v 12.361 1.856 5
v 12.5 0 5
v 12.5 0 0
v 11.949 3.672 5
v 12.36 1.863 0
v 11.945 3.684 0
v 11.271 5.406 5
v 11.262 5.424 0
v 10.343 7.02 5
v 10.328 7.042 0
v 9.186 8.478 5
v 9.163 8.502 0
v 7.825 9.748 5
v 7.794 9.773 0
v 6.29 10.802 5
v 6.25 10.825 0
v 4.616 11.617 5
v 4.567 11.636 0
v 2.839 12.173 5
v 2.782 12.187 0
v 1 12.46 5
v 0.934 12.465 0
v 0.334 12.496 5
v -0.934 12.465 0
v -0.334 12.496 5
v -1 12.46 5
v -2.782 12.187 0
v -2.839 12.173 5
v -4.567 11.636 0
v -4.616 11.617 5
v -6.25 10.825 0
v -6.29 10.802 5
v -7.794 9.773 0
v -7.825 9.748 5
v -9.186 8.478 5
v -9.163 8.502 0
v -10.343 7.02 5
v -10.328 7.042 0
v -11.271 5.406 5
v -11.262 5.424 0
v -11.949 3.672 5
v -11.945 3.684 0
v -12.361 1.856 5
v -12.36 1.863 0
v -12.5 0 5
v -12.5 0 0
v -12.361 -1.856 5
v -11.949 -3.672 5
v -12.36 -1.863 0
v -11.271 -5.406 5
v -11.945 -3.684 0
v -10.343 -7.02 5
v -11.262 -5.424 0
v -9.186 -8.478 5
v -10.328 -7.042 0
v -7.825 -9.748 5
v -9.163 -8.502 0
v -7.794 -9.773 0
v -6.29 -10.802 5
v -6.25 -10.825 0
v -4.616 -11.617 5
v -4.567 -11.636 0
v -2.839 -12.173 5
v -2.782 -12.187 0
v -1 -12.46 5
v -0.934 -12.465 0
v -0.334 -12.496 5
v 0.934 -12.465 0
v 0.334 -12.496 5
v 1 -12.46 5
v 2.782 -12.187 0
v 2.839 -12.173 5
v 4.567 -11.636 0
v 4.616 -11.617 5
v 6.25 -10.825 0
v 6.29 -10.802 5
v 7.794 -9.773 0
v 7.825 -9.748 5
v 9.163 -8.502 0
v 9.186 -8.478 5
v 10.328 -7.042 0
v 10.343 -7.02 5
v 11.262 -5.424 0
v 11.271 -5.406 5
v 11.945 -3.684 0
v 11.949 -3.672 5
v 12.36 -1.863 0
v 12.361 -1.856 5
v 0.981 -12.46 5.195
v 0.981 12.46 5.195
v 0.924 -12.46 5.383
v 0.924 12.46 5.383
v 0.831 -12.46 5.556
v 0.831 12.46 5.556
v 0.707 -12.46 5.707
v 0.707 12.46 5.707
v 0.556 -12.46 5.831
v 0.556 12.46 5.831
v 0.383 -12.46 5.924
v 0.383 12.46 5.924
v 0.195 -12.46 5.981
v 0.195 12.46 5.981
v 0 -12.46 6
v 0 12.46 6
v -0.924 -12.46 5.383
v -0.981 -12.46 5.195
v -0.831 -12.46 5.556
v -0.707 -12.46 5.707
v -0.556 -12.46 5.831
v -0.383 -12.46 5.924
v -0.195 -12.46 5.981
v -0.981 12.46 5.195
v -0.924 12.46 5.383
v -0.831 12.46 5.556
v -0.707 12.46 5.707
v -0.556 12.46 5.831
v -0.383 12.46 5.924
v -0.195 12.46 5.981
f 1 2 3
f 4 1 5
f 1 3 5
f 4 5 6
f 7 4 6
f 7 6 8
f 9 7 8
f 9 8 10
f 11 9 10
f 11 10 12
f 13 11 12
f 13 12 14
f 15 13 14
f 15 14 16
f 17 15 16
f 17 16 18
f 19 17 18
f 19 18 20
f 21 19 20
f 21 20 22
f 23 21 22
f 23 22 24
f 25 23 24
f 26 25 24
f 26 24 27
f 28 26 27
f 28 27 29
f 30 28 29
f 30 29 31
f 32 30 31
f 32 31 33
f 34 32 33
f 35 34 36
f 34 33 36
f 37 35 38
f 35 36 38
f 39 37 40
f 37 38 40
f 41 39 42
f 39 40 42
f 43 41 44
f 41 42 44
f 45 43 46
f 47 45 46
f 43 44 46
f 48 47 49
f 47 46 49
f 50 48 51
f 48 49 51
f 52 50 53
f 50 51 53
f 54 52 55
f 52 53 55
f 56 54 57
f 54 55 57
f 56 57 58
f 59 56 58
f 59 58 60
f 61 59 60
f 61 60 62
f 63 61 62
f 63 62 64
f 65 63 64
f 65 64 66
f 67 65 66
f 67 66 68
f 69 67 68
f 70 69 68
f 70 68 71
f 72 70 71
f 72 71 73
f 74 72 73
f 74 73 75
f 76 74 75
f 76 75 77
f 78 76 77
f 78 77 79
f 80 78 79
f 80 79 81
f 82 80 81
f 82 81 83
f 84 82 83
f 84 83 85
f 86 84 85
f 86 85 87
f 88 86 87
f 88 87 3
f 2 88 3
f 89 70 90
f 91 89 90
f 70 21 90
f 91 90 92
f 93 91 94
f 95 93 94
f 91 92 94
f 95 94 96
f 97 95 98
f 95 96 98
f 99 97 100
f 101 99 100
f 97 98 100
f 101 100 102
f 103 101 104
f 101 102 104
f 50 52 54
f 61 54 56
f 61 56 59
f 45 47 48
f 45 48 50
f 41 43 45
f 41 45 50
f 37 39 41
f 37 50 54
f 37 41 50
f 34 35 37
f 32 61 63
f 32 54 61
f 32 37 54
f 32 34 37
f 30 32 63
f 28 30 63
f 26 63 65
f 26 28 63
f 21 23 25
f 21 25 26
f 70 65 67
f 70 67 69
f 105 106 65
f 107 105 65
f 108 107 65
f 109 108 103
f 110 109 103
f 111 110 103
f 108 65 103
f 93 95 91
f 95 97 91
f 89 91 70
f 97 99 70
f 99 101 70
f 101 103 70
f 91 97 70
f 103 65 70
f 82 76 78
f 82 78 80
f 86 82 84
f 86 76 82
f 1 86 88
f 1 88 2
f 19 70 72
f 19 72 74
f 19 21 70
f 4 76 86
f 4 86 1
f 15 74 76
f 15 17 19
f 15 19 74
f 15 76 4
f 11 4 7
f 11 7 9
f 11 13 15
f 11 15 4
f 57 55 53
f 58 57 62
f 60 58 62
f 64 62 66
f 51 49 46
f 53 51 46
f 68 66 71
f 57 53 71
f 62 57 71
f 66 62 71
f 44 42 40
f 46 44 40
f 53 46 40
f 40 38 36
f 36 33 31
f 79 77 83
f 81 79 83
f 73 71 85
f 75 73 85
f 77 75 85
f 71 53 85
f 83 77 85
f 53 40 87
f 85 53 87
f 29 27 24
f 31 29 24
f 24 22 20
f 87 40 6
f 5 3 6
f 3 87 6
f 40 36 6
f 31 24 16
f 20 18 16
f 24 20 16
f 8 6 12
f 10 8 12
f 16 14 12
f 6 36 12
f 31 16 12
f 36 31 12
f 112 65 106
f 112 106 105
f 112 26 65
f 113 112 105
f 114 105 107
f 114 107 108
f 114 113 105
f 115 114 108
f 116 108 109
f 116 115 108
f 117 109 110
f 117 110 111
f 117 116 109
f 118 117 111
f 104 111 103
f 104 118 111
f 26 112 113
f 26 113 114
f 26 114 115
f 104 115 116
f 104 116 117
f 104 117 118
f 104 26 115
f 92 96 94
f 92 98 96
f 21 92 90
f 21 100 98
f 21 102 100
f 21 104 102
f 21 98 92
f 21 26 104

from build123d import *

# Parameters (mm, degrees)
F0_R     = 12.5
F1_DEPTH = 5
F2_W     = 2
F2_H     = 24.9198715888
F3_DEPTH = 1
F4_R     = 0.99999


# Not quite as in the source:
# - a fillet or chamfer is up to 0.001 mm smaller than in the source, because OpenCascade refuses the exact size


with BuildPart() as f1:
    # F0 (on Top) → F1 (new body)
    with BuildSketch(Plane.XY):
        Circle(F0_R)
    extrude(amount=F1_DEPTH)

    # F2 (on face) → F3 (join)
    with BuildSketch(Plane.XY.offset(5)):
        Rectangle(F2_W, F2_H)
    extrude(amount=F3_DEPTH)

    # F4 (radius 1 in the source; OpenCascade refuses exactly that, so slightly less here)
    f4_edges = [f1.edges().sort_by_distance(p)[0] for p in [
        (1, 0, 6),
        (-1, 0, 6),
    ]]
    fillet(f4_edges, radius=F4_R)


solid = f1.part
